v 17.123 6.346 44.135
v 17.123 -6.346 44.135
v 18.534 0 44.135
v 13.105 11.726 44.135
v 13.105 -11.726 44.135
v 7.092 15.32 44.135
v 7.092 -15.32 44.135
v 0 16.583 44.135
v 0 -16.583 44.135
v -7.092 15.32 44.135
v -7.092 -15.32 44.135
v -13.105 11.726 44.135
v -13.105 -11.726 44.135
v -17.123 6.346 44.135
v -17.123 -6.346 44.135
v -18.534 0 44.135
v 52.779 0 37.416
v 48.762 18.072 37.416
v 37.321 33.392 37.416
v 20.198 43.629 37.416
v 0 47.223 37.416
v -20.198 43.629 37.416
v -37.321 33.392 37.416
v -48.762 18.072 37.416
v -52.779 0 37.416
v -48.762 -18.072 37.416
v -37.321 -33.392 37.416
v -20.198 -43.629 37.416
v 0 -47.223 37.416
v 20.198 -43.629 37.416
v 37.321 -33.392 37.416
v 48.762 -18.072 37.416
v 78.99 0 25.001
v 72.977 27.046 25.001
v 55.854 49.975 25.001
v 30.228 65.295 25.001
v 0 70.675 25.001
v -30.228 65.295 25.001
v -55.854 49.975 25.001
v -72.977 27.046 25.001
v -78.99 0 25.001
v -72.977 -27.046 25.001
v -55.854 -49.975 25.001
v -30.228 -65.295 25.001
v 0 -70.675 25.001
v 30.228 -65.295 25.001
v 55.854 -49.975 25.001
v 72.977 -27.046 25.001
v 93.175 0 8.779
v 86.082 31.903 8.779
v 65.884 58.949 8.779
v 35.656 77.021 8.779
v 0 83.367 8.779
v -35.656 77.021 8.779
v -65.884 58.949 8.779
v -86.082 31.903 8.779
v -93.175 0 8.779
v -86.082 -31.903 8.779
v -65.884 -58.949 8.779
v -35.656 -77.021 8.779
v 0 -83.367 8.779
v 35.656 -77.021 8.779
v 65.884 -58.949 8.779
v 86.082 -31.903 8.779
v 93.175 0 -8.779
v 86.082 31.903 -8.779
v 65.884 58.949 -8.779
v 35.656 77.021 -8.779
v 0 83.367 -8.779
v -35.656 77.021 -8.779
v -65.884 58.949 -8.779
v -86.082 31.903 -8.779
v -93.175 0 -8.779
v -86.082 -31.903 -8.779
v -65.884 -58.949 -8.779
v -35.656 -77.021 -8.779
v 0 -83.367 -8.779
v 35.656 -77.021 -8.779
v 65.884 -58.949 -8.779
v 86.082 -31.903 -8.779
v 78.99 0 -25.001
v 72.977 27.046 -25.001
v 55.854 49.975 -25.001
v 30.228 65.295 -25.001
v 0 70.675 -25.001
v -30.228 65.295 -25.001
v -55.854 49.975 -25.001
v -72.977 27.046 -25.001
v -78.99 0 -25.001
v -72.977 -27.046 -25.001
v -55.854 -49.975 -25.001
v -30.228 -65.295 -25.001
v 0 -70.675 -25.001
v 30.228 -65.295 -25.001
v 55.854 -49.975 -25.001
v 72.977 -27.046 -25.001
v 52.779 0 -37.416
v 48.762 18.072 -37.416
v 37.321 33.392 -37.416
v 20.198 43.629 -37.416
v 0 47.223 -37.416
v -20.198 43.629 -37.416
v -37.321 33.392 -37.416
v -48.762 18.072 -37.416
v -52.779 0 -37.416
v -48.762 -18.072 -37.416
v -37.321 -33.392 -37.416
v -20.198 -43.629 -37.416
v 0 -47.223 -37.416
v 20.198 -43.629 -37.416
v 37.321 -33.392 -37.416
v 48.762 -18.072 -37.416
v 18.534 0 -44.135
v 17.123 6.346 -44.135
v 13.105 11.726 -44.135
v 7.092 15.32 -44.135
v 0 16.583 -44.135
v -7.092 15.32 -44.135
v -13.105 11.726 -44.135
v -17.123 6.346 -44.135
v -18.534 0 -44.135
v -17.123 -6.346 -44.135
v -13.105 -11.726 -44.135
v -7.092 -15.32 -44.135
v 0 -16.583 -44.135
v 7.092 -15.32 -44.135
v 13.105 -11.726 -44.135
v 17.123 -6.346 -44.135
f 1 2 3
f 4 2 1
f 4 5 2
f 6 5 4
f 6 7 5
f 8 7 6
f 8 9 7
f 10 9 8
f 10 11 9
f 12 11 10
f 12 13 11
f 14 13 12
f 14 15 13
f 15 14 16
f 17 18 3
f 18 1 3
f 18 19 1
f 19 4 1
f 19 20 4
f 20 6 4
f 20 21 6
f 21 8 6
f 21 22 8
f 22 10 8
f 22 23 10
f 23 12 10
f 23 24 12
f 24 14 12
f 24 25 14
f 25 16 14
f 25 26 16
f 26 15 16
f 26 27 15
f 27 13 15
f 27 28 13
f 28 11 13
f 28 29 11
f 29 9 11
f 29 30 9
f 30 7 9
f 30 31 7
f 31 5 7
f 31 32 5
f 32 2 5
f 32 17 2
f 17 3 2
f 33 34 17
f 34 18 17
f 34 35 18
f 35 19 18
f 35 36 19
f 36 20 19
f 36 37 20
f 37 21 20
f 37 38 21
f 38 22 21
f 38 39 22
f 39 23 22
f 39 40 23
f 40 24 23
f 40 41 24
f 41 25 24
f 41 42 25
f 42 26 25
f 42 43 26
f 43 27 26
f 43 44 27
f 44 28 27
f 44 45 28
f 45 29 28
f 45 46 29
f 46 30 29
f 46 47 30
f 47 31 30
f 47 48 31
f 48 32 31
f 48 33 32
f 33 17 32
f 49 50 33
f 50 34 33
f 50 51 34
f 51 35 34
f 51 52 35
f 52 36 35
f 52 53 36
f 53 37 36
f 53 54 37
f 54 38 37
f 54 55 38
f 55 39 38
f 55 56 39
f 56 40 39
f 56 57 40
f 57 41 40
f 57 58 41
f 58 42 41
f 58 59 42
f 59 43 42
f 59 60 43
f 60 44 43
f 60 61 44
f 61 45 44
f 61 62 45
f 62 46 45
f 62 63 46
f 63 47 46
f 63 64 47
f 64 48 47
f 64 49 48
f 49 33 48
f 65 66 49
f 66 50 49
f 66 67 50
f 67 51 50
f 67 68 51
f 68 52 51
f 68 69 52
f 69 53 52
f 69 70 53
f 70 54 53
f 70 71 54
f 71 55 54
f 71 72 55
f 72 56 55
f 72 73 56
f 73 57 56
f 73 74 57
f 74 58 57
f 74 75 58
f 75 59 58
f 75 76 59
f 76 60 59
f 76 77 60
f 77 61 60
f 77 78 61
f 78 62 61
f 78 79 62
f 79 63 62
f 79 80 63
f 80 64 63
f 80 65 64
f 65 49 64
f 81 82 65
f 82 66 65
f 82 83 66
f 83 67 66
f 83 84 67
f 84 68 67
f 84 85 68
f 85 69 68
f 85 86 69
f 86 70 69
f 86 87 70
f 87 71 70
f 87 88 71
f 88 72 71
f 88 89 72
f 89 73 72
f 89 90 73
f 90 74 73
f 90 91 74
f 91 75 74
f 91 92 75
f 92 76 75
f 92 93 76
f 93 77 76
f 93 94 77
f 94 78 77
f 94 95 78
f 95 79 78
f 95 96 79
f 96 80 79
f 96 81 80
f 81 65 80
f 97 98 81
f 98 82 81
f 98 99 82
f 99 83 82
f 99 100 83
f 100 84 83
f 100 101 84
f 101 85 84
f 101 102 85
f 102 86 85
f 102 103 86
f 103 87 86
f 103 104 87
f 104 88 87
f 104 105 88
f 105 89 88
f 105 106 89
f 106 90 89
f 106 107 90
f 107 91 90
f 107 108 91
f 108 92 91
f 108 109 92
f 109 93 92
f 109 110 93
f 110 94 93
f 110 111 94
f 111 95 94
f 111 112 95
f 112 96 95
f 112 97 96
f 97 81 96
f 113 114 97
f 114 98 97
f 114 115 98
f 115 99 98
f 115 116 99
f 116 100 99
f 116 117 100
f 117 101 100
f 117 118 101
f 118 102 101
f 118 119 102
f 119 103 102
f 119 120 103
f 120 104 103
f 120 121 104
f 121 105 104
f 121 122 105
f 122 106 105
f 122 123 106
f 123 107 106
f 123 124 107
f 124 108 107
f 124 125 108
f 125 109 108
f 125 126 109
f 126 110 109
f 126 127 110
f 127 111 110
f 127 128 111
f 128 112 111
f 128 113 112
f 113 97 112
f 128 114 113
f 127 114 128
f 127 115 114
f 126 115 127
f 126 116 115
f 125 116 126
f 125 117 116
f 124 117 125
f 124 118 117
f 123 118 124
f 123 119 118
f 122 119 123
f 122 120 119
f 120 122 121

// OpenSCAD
// Generated by SolidPython 1.0.1 on 2020-07-29 00:46:54


scale(v = [19, 17, 9]) {
	sphere(r = 5);
}
/***********************************************
*********      SolidPython code:      **********
************************************************
 
# import packages: SolidPython
from solid import *
from solid.utils import *
from itertools import chain, combinations, permutations


class Resize:

    def __init__(self, scad_file):
        self.scad_file = scad_file
        #self.scad_file = import_scad(scad_file)
        # cone/cylinder param:
        self.r1 = 0
        self.r2 = 0
        self.h = 0
        # rectangular prism param:
        self.w = 0
        self.l = 0
        # ellipse param:
        self.r = 0

    # import OpenScad code (file name corresponds to shape)


    # classify shape + parameters
    def assign(self, param1, param2, param3):
        if self.scad_file == 'cone.scad':
            self.r1 = param1
            self.r2 = param2
            self.h = param3
        elif self.scad_file == 'cylinder.scad':
            self.r1 = param1
            self.r2 = param2
            self.h = param3
        elif self.scad_file == 'rectangularPrism.scad':
            self.h = param1
            self.l = param2
            self.w = param3
        else:
            self.r = param1
            self.h = param2

    # resize parameters
    def iterate(self):
        x = range(3, 20, 2)
        i = 1
        if self.scad_file == 'cone.scad':
            tempList = list(permutations(x, 2))
            for temp in tempList:
                param1 = temp[0]
                param2 = temp[1]
                filepath = 'produced_scad_files/' + 'cone' + str(param1) + '_' + str(param2) + '_' + '.scad'
                scad_render_to_file(cylinder(h=param1, r1=param2, r2=0), filepath)

        elif self.scad_file == 'cylinder.scad':
            tempList = list(permutations(x, 3))
            for temp in tempList:
                param1 = temp[0]
                param2 = temp[1]
                filepath = 'produced_scad_files/' + 'cylinder' + str(param1) + '_' + str(param2) + '_' + '.scad'
                scad_render_to_file(cylinder(h=param1, r1=param2, r2=param2), filepath)

        elif self.scad_file == 'rectangularPrism.scad':
            tempList = list(permutations(x, 3))
            for temp in tempList:
                param1 = temp[0]
                param2 = temp[1]
                param3 = temp[2]
                filepath = 'produced_scad_files/' + 'rectangularPrism' + str(param1) + '_' + str(param2) + '_' + str(
                    param3) + '.scad'
                scad_render_to_file(cube(size=(param1, param2, param3)), filepath)

        elif self.scad_file == 'ellipse.scad':
            tempList = list(permutations(x, 4))
            for temp in tempList:
                param1 = temp[0]
                param2 = temp[1]
                param3 = temp[2]
                param4 = temp[3]
                filepath = 'produced_scad_files/' + 'ellipse' + str(param1) + '_' + str(param2) + '_' + str(param3) + '_' + str(param4) + '.scad'
                scad_render_to_file(scale([param1, param2, param3])(sphere(r=param4)), filepath)

    def render_to_scadfile(self):
        scad_render_to_file(scad, 'example.scad') 
 
************************************************/
